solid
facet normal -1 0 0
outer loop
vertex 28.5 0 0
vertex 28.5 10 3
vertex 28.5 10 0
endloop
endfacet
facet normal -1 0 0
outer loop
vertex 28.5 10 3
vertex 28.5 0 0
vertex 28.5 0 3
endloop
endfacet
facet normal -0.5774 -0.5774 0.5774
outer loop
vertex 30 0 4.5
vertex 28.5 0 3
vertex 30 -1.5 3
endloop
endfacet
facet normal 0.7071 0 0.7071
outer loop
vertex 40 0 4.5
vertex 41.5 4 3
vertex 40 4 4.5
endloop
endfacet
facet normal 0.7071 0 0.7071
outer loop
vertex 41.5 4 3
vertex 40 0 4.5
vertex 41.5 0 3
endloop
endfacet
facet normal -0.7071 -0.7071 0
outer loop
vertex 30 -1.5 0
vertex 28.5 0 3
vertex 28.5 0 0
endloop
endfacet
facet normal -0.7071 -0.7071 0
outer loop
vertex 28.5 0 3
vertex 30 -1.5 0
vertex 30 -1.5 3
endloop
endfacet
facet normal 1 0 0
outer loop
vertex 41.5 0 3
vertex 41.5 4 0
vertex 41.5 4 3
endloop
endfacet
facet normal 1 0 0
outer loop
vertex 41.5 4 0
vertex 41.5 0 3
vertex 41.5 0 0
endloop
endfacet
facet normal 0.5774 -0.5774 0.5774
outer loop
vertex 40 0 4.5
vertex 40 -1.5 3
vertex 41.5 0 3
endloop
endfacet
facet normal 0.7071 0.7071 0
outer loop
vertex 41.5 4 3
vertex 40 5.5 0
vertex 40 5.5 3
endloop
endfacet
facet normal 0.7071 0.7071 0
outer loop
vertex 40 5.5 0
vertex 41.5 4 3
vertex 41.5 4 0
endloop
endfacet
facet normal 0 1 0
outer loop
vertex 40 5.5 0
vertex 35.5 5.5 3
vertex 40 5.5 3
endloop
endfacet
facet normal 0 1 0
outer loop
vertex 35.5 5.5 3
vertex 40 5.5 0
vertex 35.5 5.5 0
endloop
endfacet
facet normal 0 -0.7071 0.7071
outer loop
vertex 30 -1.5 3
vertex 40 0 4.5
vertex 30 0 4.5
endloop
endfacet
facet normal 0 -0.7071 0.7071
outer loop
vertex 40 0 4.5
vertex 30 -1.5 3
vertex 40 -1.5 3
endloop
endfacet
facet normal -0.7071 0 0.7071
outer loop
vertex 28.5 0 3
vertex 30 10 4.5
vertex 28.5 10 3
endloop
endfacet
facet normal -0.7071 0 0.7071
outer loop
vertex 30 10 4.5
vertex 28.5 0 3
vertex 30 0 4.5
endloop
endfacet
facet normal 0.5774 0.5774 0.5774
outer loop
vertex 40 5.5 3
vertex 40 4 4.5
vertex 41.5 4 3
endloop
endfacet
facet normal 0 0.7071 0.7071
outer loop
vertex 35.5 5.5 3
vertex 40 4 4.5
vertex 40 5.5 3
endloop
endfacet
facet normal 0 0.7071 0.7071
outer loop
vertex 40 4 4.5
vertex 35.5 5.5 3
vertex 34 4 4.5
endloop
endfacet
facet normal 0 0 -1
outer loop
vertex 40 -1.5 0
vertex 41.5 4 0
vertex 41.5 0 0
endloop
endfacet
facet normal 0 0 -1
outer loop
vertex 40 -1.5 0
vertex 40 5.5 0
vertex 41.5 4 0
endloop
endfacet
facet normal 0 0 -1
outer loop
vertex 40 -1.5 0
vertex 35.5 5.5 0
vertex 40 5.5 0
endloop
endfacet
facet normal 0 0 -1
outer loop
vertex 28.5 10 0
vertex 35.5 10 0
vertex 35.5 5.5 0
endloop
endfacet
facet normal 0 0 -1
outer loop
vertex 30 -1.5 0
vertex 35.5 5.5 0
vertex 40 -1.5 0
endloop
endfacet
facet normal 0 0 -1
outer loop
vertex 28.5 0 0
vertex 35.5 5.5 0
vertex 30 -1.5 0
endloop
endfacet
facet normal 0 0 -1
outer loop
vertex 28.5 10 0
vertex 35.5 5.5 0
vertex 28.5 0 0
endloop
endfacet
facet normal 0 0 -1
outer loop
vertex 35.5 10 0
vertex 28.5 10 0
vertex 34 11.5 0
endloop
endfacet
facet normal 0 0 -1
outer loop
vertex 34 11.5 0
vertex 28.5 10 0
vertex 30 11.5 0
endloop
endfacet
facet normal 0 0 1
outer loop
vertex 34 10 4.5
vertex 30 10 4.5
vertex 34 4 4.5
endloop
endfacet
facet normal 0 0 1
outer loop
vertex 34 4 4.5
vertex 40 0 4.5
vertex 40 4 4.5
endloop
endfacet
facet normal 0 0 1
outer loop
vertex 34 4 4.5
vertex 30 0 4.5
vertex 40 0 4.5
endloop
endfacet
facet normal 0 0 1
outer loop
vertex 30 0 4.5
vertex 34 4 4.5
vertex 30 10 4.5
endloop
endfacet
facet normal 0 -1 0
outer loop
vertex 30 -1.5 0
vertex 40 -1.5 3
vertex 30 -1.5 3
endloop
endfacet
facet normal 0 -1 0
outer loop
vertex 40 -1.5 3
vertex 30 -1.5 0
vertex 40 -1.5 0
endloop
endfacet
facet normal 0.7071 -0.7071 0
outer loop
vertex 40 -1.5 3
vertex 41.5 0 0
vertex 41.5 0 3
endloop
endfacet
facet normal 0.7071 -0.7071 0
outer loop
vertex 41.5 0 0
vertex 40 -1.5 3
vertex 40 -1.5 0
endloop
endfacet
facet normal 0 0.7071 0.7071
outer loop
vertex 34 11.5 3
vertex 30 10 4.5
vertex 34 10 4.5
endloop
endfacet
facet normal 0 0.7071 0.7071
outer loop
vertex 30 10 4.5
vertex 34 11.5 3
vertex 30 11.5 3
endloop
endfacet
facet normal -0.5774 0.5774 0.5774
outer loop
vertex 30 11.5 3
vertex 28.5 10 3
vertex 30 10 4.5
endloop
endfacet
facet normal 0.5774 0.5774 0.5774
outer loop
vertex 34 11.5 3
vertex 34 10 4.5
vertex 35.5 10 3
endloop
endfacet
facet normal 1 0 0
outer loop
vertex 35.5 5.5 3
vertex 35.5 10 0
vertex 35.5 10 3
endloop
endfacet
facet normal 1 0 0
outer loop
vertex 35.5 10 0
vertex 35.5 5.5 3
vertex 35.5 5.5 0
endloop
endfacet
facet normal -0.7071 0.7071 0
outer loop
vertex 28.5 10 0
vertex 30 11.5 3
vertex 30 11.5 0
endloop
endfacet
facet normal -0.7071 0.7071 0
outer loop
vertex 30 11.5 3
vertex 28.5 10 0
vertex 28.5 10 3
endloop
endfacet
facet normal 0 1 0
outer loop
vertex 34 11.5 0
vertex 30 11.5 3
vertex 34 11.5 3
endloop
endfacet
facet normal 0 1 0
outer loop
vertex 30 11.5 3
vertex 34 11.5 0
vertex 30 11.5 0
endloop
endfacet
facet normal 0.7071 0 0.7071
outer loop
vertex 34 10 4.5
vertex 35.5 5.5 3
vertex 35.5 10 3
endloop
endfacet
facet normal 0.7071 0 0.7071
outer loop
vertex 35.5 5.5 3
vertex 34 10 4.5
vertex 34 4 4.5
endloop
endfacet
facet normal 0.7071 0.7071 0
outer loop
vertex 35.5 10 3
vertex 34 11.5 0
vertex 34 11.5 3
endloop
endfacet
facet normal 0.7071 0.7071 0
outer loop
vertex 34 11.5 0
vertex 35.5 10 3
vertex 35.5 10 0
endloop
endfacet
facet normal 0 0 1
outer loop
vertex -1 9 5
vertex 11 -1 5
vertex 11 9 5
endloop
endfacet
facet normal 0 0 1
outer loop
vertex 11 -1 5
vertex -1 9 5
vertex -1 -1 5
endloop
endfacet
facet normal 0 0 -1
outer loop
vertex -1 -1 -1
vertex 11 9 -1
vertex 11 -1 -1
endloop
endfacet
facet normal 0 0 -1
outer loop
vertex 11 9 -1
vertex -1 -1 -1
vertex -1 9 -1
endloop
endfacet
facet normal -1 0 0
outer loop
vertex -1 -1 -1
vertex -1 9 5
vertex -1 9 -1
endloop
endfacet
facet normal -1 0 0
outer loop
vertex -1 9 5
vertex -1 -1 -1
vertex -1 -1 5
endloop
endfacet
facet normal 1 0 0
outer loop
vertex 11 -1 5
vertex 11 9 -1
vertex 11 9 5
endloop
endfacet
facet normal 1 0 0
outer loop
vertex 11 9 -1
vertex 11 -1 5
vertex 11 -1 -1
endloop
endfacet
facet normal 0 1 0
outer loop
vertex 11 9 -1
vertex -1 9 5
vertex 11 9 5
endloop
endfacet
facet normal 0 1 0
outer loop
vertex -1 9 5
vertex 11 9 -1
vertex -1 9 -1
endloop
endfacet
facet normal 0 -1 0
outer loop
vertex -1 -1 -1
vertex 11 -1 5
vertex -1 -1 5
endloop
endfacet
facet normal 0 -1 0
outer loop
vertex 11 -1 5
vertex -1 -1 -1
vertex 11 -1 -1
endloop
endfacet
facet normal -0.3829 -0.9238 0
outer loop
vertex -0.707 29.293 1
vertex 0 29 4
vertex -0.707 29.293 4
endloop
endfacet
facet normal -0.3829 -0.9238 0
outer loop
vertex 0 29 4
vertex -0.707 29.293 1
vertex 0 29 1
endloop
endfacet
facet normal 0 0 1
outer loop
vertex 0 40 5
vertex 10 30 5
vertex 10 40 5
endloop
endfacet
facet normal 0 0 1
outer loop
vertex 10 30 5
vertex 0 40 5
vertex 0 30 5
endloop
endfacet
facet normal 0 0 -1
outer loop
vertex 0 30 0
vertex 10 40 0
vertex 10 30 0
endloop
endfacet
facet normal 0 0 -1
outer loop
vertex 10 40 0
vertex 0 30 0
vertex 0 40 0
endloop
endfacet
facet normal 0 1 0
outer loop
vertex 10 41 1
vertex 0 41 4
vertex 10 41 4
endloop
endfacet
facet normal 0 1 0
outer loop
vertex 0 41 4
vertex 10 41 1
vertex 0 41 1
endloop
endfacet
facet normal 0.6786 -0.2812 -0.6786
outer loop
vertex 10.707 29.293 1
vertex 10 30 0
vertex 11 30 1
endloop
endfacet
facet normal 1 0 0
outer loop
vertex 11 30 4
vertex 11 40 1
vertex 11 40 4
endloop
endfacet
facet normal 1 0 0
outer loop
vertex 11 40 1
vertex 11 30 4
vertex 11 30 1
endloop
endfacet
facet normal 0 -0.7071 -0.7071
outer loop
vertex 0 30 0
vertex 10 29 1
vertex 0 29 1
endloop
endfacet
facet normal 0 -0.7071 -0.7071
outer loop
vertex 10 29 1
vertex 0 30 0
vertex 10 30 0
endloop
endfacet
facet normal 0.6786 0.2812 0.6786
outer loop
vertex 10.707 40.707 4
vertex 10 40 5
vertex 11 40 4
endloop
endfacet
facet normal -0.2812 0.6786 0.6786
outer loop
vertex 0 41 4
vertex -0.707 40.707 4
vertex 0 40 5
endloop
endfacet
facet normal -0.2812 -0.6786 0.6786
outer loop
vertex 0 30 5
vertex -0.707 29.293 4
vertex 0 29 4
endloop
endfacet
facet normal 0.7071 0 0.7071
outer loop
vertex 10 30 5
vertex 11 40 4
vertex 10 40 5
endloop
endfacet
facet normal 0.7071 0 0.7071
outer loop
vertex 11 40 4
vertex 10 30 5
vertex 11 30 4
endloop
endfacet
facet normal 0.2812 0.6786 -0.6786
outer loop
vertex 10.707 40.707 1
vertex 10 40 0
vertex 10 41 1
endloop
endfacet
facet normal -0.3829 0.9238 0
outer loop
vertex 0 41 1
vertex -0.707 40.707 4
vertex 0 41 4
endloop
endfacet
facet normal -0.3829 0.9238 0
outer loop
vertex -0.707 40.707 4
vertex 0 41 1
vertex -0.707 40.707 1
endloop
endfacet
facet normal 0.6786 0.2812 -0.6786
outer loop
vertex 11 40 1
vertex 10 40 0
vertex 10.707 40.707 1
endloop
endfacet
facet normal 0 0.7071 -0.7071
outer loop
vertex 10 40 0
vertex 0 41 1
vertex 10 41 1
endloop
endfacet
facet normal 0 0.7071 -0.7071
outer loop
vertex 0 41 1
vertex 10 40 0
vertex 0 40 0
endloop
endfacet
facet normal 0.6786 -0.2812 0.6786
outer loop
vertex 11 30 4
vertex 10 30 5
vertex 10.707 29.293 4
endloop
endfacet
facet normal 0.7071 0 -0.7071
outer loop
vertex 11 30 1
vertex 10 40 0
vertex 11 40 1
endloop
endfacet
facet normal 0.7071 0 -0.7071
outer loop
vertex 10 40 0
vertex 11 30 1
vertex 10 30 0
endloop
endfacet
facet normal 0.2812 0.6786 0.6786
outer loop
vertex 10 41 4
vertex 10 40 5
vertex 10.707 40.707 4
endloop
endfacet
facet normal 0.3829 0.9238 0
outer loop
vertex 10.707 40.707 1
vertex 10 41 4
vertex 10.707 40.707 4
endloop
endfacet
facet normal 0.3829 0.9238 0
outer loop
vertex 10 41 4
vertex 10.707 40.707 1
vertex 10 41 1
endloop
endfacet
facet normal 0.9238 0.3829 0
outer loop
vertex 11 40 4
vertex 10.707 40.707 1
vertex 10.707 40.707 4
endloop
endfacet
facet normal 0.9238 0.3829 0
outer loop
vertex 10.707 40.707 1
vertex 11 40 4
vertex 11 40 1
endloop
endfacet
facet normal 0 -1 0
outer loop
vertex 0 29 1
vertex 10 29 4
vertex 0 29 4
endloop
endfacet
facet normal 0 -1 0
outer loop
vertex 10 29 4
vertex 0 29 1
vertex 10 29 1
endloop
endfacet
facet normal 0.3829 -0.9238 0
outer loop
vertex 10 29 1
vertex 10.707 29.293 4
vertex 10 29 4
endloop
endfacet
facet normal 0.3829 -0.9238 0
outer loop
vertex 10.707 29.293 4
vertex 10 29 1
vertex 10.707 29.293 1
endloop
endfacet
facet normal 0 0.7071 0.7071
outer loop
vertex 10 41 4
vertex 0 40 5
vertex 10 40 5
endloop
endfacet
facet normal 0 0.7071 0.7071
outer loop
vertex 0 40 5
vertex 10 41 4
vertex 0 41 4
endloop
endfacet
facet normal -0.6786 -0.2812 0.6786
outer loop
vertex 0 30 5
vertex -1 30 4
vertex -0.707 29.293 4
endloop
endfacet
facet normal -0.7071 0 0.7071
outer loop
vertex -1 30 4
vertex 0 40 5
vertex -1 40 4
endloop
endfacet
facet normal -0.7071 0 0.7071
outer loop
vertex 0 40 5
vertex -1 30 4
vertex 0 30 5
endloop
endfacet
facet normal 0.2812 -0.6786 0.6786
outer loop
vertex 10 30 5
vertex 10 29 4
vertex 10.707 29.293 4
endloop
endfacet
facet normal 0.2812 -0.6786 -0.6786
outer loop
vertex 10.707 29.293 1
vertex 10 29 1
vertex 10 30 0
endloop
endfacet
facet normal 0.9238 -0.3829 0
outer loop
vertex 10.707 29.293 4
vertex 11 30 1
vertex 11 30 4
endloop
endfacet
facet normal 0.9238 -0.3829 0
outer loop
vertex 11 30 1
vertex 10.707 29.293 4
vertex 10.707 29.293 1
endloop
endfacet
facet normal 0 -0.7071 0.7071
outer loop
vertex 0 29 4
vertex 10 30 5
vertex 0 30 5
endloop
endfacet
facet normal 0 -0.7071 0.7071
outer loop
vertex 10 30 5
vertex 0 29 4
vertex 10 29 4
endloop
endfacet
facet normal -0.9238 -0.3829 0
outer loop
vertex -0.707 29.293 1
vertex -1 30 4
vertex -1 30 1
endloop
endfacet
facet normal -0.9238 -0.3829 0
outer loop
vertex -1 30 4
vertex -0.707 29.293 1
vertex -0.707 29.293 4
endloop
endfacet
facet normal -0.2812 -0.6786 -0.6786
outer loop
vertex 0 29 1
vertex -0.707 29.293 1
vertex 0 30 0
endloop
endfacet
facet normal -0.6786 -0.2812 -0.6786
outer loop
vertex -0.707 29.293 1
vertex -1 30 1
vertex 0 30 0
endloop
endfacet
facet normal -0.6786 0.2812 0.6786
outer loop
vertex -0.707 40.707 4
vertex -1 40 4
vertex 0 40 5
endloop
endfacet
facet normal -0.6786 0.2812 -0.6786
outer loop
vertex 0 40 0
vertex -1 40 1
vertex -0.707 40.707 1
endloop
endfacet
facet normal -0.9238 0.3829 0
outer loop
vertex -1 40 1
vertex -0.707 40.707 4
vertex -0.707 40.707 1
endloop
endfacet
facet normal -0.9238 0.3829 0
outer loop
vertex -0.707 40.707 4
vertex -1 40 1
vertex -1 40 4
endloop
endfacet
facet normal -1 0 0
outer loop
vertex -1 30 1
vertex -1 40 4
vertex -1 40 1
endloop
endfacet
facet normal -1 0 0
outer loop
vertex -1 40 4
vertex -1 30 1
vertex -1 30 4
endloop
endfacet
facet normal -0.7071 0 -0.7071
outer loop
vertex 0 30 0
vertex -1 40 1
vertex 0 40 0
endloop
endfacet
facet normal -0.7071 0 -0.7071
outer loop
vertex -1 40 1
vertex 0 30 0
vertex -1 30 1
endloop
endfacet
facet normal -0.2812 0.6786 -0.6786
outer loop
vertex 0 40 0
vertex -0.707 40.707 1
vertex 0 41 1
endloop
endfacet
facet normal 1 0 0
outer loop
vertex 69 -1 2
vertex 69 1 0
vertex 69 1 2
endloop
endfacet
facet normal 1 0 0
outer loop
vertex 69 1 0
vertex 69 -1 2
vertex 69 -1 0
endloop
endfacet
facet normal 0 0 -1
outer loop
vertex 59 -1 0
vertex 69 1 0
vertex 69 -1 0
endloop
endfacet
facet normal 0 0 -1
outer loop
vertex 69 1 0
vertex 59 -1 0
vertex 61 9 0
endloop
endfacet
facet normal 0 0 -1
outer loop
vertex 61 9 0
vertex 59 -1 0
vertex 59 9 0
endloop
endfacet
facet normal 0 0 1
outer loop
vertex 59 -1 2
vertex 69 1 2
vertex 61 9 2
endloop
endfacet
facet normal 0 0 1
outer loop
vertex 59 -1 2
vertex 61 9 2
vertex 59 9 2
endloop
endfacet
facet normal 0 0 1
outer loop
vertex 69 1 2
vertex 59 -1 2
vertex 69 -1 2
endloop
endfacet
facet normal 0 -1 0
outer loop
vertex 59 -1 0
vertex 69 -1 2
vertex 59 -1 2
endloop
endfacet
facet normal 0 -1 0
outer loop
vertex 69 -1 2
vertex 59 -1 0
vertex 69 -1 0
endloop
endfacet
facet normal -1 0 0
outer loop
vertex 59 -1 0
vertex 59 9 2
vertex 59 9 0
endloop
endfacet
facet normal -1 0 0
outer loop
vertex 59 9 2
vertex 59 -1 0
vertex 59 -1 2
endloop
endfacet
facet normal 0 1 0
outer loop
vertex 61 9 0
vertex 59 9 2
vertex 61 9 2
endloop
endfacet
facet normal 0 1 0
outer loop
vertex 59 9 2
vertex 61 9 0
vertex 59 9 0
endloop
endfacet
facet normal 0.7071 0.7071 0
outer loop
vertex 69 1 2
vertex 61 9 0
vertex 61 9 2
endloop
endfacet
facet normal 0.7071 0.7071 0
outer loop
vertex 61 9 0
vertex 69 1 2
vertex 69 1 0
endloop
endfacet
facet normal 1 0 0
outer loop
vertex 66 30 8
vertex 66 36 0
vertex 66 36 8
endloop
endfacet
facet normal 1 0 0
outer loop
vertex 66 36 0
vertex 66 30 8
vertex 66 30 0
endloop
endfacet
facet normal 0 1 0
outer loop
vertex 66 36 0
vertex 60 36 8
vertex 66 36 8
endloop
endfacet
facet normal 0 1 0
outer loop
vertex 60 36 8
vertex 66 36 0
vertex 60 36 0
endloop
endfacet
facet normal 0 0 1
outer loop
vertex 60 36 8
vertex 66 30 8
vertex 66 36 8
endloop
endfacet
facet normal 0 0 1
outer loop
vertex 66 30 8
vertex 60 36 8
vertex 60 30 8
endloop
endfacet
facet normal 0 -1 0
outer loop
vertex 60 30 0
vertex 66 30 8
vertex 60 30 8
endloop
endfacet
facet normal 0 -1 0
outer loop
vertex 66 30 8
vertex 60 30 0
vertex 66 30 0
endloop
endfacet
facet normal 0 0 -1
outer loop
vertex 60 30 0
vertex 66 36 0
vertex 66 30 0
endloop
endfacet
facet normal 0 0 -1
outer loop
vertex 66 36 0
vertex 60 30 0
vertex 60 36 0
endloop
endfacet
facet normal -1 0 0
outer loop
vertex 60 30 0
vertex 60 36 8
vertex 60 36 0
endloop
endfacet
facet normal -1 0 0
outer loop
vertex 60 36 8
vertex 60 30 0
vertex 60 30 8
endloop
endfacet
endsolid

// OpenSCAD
// minkowski with a straight-edged convex kernel: base ∪ hull(triangle ⊕ kernel), exact here
// box ⊕ box = a (10+2) x (8+2) x (4+2) box
minkowski() { cube([10, 8, 4]); cube(2, center = true); }
// a non-convex L prism bevelled by a 4-sided pyramid, the corpus's letter-tile idiom
translate([30, 0, 0]) minkowski() {
    linear_extrude(3) polygon([[0, 0], [10, 0], [10, 4], [4, 4], [4, 10], [0, 10]]);
    cylinder(r1 = 1.5, r2 = 0, h = 1.5, $fn = 4);
}
// a bipyramid kernel (hull of two cones), the glasses-arm idiom; the apex-down cone lofts from a point
translate([0, 30, 0]) minkowski() {
    cube([10, 10, 3]);
    hull() { cylinder(r1 = 0, r2 = 1, h = 1, $fn = 8); translate([0, 0, 1]) cylinder(r1 = 1, r2 = 0, h = 1, $fn = 8); }
}
// 2D: triangle ⊕ square, extruded so the diff can mesh it
translate([60, 0, 0]) linear_extrude(2) minkowski() { polygon([[0, 0], [8, 0], [0, 8]]); square(2, center = true); }
// three children fold left
translate([60, 30, 0]) minkowski() { cube(4); cube(1); cube([1, 1, 3]); }
